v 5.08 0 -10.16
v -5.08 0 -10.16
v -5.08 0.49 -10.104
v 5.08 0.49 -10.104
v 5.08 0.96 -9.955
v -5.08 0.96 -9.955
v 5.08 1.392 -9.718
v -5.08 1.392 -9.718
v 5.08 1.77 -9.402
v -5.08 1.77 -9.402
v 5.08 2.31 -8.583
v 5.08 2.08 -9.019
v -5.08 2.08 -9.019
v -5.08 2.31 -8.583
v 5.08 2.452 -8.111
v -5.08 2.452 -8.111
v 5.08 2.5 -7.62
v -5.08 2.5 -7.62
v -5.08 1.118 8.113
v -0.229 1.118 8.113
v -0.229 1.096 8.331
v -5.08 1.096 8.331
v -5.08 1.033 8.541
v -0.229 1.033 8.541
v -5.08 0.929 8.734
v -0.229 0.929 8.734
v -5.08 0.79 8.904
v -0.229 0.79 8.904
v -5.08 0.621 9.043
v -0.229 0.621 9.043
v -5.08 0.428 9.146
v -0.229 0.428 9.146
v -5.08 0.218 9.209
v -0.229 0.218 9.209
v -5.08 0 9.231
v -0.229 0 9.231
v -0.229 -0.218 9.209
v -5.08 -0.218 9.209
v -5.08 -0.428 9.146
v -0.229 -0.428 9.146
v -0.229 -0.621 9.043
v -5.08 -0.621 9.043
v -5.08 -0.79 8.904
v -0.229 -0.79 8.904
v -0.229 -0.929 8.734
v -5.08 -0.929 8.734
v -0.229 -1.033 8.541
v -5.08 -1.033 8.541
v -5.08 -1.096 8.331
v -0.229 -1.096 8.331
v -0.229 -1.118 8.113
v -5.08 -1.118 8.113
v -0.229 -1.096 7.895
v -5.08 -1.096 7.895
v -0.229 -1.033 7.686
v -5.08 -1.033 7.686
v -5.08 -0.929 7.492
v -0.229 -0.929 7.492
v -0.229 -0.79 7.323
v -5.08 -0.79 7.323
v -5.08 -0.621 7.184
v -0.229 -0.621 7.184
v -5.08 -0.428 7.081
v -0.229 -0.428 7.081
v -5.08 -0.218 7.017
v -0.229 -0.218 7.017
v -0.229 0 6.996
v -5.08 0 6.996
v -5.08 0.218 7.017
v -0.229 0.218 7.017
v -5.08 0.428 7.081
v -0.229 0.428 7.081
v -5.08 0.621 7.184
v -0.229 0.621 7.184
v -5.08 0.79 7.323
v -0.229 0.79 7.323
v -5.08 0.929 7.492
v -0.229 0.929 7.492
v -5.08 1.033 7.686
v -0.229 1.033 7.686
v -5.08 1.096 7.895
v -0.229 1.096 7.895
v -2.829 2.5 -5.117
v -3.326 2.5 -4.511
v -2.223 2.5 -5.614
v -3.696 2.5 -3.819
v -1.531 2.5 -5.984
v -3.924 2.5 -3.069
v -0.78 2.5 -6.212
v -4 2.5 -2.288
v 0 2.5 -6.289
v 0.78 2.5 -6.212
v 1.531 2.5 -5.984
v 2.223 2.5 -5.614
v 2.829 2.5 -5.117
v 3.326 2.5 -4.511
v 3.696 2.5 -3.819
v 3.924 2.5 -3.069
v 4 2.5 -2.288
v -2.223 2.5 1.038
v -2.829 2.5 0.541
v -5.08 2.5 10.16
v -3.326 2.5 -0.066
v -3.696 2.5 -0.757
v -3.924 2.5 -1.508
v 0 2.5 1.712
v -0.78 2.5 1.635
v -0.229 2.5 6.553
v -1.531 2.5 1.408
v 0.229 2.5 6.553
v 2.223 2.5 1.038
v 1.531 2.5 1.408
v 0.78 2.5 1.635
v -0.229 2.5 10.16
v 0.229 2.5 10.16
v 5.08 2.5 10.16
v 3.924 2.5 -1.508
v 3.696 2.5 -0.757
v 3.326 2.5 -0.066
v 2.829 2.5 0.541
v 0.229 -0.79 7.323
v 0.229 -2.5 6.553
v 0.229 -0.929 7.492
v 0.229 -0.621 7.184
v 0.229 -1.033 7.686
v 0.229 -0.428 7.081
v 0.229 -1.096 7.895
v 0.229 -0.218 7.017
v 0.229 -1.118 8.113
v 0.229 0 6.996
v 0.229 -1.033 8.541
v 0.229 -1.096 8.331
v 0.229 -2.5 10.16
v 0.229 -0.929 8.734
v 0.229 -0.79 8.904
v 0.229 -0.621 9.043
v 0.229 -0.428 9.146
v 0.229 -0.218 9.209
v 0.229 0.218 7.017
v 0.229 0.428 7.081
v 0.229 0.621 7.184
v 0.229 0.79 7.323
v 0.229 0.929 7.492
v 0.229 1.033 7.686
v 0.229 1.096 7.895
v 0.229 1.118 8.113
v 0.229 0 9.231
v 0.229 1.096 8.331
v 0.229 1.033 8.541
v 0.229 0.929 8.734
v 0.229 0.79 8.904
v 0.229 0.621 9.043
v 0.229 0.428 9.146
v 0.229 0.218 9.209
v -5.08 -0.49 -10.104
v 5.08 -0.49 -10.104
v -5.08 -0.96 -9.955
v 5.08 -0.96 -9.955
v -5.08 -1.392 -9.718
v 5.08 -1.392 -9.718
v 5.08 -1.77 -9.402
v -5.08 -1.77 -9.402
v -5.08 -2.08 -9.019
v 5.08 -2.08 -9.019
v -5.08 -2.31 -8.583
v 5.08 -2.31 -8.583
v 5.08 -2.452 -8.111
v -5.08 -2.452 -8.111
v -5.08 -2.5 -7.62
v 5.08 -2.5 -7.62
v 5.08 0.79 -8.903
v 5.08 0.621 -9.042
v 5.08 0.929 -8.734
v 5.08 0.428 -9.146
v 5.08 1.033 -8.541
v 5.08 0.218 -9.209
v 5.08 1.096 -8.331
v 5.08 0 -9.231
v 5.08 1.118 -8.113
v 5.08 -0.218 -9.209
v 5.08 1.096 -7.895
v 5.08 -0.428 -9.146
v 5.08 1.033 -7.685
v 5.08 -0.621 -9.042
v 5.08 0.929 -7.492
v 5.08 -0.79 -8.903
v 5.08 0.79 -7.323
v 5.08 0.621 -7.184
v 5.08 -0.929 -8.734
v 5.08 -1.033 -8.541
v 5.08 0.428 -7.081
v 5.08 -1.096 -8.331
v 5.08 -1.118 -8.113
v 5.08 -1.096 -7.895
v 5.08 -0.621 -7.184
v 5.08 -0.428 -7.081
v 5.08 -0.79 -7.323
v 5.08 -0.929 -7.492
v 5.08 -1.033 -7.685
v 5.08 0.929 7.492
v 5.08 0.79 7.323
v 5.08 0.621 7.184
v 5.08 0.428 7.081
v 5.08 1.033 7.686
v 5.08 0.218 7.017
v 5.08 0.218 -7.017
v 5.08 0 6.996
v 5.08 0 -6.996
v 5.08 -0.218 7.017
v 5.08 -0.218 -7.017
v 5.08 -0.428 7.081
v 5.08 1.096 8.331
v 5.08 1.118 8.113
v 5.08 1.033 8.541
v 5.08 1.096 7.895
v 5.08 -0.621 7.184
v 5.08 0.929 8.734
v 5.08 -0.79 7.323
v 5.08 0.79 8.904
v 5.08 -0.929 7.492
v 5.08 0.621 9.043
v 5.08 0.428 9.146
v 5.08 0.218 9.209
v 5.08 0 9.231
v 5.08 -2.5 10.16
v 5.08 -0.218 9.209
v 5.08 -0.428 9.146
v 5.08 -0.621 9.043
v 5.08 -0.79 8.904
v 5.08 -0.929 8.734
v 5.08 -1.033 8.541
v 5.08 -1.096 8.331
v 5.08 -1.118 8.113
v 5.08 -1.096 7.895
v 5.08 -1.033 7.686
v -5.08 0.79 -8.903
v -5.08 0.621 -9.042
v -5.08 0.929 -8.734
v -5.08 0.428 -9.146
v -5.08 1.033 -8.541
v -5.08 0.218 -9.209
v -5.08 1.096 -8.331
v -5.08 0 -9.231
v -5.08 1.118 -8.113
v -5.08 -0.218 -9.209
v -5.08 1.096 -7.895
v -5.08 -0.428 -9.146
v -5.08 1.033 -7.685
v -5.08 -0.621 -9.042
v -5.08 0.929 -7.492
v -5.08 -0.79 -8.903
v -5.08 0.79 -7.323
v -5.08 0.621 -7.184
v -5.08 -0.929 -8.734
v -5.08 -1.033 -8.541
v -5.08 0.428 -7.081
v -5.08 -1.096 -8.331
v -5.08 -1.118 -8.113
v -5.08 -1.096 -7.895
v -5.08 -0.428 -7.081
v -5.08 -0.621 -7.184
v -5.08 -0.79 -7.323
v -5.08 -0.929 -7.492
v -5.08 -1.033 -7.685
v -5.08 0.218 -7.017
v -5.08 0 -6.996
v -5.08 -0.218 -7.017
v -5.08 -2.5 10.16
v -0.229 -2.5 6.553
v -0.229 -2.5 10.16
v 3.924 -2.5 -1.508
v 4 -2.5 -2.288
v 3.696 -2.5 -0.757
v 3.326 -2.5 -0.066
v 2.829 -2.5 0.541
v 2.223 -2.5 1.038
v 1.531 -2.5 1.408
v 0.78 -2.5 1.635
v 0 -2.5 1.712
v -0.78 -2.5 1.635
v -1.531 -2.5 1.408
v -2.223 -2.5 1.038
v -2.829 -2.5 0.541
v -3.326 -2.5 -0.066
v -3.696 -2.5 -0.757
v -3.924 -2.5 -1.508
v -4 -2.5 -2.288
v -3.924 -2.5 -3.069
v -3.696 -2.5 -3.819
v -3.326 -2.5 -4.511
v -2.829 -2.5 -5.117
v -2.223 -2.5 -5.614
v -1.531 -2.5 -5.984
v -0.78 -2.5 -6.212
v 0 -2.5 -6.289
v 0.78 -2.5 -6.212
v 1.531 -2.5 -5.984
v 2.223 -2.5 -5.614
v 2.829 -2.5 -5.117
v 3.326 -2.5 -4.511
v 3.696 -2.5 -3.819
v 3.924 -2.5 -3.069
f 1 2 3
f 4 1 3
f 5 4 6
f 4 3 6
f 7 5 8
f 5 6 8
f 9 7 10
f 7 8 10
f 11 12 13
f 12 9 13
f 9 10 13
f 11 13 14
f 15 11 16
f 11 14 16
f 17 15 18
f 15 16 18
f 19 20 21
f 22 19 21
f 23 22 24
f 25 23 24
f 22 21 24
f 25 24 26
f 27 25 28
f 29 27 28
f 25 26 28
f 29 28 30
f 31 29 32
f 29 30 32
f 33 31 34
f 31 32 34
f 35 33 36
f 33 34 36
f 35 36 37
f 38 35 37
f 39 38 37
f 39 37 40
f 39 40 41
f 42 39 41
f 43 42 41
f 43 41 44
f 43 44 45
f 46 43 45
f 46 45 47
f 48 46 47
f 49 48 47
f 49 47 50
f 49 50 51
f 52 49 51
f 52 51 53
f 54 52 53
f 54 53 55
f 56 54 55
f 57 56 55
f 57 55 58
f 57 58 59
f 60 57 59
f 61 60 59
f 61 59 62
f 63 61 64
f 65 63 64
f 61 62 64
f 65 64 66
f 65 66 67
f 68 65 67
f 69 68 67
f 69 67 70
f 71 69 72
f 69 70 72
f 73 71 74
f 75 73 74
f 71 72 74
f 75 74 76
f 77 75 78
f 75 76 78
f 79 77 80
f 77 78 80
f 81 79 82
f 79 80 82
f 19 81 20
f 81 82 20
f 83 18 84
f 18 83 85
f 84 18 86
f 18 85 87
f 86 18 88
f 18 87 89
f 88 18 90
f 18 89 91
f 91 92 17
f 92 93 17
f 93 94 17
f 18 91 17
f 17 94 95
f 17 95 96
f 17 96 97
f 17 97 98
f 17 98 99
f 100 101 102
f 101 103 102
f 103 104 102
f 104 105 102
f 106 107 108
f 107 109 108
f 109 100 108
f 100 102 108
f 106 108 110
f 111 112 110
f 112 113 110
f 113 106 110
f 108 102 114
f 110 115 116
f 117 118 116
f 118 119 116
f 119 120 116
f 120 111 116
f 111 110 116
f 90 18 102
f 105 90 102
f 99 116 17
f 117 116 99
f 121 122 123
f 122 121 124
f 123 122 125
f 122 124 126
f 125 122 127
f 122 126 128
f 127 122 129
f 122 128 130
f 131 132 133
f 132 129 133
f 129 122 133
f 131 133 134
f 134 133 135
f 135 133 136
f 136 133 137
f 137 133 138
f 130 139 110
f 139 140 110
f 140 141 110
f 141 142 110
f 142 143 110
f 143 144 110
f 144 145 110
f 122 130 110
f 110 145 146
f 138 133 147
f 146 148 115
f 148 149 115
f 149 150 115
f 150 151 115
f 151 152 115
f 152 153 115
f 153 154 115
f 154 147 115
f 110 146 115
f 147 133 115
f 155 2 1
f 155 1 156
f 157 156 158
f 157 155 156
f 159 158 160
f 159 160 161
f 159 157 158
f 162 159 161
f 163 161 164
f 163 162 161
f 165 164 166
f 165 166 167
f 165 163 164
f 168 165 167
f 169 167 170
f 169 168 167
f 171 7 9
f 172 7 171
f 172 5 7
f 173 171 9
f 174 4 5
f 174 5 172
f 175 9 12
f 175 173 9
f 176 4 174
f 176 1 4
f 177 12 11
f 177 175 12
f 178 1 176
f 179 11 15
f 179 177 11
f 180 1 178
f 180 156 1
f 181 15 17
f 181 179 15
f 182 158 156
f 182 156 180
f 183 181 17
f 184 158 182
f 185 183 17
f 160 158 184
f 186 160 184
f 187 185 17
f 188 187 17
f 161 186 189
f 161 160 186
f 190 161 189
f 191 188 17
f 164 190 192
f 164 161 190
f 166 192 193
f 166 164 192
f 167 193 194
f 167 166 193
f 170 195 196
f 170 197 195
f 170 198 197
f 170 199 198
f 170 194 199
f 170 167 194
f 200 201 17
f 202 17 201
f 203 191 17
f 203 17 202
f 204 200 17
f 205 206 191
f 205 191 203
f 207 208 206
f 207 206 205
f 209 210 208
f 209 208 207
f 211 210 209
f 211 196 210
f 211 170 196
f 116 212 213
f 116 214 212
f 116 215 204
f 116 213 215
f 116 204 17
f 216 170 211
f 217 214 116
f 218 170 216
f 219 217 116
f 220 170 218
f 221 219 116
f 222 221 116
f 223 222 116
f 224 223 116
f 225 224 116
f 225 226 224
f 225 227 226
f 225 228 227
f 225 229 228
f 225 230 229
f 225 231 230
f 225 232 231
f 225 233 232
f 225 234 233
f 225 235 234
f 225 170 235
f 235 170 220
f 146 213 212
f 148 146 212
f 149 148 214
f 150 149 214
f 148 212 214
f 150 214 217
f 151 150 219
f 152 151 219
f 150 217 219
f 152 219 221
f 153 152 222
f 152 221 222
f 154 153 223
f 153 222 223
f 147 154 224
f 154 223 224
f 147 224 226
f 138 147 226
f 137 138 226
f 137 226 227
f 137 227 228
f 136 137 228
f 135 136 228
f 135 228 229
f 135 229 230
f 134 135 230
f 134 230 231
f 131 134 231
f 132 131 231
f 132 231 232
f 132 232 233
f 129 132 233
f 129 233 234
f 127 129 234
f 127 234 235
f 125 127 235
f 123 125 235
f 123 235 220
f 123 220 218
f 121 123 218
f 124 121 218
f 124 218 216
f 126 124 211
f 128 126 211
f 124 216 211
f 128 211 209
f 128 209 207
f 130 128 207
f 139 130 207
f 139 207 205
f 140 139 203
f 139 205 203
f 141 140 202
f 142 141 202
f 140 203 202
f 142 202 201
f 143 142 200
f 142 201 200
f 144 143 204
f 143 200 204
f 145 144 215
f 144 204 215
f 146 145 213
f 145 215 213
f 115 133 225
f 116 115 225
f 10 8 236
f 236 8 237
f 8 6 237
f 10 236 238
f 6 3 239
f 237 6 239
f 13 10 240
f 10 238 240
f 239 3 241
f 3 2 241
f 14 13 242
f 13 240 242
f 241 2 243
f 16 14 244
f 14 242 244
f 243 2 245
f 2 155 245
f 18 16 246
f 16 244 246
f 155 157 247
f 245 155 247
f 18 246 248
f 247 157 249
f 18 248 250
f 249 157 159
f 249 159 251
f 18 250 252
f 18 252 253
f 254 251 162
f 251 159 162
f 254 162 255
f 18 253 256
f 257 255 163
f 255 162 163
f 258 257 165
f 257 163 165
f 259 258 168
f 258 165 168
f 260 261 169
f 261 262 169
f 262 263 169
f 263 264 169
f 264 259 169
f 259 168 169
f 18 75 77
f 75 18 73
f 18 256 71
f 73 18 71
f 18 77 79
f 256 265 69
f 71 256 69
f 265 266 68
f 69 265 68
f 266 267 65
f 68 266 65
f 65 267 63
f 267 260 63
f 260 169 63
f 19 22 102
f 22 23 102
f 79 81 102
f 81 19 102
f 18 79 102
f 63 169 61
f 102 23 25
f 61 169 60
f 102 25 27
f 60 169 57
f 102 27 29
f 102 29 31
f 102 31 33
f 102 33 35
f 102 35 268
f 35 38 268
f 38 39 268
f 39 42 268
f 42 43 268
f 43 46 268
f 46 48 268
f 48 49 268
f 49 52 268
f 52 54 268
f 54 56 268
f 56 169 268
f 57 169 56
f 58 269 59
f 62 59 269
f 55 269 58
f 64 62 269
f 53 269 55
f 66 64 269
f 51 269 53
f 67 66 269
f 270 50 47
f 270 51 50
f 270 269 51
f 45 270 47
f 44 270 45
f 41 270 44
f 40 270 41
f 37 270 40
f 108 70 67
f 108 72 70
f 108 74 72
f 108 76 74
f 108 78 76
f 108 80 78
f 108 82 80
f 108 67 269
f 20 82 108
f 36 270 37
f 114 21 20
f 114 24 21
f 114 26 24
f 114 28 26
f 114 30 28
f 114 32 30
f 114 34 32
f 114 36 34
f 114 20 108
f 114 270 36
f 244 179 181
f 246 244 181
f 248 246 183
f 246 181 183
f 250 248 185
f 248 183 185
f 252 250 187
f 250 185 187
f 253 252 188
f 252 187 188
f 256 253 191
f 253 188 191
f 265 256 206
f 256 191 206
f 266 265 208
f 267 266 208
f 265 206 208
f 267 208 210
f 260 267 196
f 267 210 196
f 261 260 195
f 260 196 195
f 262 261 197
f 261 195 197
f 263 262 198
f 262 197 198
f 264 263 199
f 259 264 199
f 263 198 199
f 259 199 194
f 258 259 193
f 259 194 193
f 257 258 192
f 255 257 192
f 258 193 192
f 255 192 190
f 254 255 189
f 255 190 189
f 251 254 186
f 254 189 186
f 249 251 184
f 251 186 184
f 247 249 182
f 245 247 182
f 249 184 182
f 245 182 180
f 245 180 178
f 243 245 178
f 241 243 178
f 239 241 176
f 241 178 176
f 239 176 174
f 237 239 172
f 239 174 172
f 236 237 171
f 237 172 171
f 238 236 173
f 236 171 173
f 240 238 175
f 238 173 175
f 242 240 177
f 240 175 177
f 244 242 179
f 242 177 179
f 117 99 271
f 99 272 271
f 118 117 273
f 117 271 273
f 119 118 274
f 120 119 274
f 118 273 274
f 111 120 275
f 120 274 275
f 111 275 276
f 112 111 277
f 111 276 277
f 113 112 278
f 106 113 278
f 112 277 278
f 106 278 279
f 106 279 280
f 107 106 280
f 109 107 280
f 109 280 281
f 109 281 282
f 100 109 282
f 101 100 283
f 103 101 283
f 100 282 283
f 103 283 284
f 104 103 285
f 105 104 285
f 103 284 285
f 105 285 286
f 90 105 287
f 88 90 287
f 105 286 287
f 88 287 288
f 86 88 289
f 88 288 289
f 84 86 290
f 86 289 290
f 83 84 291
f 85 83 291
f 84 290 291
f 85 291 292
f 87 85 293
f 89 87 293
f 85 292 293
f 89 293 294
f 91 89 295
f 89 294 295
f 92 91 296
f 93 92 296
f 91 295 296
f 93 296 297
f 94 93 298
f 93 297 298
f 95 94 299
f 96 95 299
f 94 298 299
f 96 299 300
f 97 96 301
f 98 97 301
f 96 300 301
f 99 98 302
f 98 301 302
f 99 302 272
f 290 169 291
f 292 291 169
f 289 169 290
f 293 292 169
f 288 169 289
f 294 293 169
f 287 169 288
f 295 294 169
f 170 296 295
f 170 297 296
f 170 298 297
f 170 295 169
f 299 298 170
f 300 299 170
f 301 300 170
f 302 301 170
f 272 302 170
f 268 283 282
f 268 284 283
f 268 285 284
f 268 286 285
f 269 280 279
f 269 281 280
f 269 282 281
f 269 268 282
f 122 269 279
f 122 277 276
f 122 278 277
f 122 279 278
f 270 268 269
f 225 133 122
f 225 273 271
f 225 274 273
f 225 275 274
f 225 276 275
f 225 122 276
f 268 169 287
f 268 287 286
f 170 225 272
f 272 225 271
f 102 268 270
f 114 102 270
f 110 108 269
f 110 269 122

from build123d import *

# Parameters (mm, degrees)
F0_W         = 10.16
F0_H         = 20.32
F2_DEPTH     = 2.5
F1_R         = 4.0005
F3_DEPTH     = 4
F4_R         = 1.1176
F5_DEPTH     = 10.16
F6_W         = 0.4572
F6_H         = 5
F7_DEPTH     = 3.6068
F8_R         = 1.1176
F9_DEPTH     = 10.16
F10_T1_DEPTH = 22.86


# Not quite as in the source:
# - a fillet or chamfer that OpenCascade refuses, or shapes differently, is made with other operations: its cross-section is extruded or revolved along the edge and cut away or added


with BuildPart() as f2:
    # F0 (on Front) → F2 (new body, symmetric)
    with BuildSketch(Plane.XZ):
        Rectangle(F0_W, F0_H)
    extrude(amount=F2_DEPTH, both=True)

    # F1 (on face) → F3 (cut, symmetric)
    with BuildSketch(Plane.XZ):
        with Locations((0, -2.2881471086)):
            Circle(F1_R)
    extrude(amount=F3_DEPTH, both=True, mode=Mode.SUBTRACT)

    # F4 (on face) → F5 (cut)
    with BuildSketch(Plane.YZ.offset(5.08)):
        with Locations((0, -8.1131188199)):
            Circle(F4_R)
    extrude(amount=-F5_DEPTH, mode=Mode.SUBTRACT)

    # F6 (on face) → F7 (cut)
    with BuildSketch(Plane.XY.offset(10.16)):
        Rectangle(F6_W, F6_H)
    extrude(amount=-F7_DEPTH, mode=Mode.SUBTRACT)

    # F8 (on face) → F9 (cut)
    with BuildSketch(Plane.YZ.offset(5.08)):
        with Locations((0, 8.1132977634)):
            Circle(F8_R)
    extrude(amount=-F9_DEPTH, mode=Mode.SUBTRACT)

    # F10: fillet of radius 2.54 on 2 edges, made by hand

    # F10_s2 → F10_t1 (cut)
    with BuildSketch(Plane.YZ.offset(-11.43)):
        with BuildLine():
            ThreePointArc((-0.04, -10.16), (1.7560512242, -9.4160512242), (2.5, -7.62))
            Line((2.5, -7.62), (2.5, -10.16))
            Line((2.5, -10.16), (-0.04, -10.16))
        make_face()
        with BuildLine():
            ThreePointArc((0.04, -10.16), (-1.7560512242, -9.4160512242), (-2.5, -7.62))
            Line((-2.5, -7.62), (-2.5, -10.16))
            Line((-2.5, -10.16), (0.04, -10.16))
        make_face()
    extrude(amount=F10_T1_DEPTH, mode=Mode.SUBTRACT)


solid = f2.part
